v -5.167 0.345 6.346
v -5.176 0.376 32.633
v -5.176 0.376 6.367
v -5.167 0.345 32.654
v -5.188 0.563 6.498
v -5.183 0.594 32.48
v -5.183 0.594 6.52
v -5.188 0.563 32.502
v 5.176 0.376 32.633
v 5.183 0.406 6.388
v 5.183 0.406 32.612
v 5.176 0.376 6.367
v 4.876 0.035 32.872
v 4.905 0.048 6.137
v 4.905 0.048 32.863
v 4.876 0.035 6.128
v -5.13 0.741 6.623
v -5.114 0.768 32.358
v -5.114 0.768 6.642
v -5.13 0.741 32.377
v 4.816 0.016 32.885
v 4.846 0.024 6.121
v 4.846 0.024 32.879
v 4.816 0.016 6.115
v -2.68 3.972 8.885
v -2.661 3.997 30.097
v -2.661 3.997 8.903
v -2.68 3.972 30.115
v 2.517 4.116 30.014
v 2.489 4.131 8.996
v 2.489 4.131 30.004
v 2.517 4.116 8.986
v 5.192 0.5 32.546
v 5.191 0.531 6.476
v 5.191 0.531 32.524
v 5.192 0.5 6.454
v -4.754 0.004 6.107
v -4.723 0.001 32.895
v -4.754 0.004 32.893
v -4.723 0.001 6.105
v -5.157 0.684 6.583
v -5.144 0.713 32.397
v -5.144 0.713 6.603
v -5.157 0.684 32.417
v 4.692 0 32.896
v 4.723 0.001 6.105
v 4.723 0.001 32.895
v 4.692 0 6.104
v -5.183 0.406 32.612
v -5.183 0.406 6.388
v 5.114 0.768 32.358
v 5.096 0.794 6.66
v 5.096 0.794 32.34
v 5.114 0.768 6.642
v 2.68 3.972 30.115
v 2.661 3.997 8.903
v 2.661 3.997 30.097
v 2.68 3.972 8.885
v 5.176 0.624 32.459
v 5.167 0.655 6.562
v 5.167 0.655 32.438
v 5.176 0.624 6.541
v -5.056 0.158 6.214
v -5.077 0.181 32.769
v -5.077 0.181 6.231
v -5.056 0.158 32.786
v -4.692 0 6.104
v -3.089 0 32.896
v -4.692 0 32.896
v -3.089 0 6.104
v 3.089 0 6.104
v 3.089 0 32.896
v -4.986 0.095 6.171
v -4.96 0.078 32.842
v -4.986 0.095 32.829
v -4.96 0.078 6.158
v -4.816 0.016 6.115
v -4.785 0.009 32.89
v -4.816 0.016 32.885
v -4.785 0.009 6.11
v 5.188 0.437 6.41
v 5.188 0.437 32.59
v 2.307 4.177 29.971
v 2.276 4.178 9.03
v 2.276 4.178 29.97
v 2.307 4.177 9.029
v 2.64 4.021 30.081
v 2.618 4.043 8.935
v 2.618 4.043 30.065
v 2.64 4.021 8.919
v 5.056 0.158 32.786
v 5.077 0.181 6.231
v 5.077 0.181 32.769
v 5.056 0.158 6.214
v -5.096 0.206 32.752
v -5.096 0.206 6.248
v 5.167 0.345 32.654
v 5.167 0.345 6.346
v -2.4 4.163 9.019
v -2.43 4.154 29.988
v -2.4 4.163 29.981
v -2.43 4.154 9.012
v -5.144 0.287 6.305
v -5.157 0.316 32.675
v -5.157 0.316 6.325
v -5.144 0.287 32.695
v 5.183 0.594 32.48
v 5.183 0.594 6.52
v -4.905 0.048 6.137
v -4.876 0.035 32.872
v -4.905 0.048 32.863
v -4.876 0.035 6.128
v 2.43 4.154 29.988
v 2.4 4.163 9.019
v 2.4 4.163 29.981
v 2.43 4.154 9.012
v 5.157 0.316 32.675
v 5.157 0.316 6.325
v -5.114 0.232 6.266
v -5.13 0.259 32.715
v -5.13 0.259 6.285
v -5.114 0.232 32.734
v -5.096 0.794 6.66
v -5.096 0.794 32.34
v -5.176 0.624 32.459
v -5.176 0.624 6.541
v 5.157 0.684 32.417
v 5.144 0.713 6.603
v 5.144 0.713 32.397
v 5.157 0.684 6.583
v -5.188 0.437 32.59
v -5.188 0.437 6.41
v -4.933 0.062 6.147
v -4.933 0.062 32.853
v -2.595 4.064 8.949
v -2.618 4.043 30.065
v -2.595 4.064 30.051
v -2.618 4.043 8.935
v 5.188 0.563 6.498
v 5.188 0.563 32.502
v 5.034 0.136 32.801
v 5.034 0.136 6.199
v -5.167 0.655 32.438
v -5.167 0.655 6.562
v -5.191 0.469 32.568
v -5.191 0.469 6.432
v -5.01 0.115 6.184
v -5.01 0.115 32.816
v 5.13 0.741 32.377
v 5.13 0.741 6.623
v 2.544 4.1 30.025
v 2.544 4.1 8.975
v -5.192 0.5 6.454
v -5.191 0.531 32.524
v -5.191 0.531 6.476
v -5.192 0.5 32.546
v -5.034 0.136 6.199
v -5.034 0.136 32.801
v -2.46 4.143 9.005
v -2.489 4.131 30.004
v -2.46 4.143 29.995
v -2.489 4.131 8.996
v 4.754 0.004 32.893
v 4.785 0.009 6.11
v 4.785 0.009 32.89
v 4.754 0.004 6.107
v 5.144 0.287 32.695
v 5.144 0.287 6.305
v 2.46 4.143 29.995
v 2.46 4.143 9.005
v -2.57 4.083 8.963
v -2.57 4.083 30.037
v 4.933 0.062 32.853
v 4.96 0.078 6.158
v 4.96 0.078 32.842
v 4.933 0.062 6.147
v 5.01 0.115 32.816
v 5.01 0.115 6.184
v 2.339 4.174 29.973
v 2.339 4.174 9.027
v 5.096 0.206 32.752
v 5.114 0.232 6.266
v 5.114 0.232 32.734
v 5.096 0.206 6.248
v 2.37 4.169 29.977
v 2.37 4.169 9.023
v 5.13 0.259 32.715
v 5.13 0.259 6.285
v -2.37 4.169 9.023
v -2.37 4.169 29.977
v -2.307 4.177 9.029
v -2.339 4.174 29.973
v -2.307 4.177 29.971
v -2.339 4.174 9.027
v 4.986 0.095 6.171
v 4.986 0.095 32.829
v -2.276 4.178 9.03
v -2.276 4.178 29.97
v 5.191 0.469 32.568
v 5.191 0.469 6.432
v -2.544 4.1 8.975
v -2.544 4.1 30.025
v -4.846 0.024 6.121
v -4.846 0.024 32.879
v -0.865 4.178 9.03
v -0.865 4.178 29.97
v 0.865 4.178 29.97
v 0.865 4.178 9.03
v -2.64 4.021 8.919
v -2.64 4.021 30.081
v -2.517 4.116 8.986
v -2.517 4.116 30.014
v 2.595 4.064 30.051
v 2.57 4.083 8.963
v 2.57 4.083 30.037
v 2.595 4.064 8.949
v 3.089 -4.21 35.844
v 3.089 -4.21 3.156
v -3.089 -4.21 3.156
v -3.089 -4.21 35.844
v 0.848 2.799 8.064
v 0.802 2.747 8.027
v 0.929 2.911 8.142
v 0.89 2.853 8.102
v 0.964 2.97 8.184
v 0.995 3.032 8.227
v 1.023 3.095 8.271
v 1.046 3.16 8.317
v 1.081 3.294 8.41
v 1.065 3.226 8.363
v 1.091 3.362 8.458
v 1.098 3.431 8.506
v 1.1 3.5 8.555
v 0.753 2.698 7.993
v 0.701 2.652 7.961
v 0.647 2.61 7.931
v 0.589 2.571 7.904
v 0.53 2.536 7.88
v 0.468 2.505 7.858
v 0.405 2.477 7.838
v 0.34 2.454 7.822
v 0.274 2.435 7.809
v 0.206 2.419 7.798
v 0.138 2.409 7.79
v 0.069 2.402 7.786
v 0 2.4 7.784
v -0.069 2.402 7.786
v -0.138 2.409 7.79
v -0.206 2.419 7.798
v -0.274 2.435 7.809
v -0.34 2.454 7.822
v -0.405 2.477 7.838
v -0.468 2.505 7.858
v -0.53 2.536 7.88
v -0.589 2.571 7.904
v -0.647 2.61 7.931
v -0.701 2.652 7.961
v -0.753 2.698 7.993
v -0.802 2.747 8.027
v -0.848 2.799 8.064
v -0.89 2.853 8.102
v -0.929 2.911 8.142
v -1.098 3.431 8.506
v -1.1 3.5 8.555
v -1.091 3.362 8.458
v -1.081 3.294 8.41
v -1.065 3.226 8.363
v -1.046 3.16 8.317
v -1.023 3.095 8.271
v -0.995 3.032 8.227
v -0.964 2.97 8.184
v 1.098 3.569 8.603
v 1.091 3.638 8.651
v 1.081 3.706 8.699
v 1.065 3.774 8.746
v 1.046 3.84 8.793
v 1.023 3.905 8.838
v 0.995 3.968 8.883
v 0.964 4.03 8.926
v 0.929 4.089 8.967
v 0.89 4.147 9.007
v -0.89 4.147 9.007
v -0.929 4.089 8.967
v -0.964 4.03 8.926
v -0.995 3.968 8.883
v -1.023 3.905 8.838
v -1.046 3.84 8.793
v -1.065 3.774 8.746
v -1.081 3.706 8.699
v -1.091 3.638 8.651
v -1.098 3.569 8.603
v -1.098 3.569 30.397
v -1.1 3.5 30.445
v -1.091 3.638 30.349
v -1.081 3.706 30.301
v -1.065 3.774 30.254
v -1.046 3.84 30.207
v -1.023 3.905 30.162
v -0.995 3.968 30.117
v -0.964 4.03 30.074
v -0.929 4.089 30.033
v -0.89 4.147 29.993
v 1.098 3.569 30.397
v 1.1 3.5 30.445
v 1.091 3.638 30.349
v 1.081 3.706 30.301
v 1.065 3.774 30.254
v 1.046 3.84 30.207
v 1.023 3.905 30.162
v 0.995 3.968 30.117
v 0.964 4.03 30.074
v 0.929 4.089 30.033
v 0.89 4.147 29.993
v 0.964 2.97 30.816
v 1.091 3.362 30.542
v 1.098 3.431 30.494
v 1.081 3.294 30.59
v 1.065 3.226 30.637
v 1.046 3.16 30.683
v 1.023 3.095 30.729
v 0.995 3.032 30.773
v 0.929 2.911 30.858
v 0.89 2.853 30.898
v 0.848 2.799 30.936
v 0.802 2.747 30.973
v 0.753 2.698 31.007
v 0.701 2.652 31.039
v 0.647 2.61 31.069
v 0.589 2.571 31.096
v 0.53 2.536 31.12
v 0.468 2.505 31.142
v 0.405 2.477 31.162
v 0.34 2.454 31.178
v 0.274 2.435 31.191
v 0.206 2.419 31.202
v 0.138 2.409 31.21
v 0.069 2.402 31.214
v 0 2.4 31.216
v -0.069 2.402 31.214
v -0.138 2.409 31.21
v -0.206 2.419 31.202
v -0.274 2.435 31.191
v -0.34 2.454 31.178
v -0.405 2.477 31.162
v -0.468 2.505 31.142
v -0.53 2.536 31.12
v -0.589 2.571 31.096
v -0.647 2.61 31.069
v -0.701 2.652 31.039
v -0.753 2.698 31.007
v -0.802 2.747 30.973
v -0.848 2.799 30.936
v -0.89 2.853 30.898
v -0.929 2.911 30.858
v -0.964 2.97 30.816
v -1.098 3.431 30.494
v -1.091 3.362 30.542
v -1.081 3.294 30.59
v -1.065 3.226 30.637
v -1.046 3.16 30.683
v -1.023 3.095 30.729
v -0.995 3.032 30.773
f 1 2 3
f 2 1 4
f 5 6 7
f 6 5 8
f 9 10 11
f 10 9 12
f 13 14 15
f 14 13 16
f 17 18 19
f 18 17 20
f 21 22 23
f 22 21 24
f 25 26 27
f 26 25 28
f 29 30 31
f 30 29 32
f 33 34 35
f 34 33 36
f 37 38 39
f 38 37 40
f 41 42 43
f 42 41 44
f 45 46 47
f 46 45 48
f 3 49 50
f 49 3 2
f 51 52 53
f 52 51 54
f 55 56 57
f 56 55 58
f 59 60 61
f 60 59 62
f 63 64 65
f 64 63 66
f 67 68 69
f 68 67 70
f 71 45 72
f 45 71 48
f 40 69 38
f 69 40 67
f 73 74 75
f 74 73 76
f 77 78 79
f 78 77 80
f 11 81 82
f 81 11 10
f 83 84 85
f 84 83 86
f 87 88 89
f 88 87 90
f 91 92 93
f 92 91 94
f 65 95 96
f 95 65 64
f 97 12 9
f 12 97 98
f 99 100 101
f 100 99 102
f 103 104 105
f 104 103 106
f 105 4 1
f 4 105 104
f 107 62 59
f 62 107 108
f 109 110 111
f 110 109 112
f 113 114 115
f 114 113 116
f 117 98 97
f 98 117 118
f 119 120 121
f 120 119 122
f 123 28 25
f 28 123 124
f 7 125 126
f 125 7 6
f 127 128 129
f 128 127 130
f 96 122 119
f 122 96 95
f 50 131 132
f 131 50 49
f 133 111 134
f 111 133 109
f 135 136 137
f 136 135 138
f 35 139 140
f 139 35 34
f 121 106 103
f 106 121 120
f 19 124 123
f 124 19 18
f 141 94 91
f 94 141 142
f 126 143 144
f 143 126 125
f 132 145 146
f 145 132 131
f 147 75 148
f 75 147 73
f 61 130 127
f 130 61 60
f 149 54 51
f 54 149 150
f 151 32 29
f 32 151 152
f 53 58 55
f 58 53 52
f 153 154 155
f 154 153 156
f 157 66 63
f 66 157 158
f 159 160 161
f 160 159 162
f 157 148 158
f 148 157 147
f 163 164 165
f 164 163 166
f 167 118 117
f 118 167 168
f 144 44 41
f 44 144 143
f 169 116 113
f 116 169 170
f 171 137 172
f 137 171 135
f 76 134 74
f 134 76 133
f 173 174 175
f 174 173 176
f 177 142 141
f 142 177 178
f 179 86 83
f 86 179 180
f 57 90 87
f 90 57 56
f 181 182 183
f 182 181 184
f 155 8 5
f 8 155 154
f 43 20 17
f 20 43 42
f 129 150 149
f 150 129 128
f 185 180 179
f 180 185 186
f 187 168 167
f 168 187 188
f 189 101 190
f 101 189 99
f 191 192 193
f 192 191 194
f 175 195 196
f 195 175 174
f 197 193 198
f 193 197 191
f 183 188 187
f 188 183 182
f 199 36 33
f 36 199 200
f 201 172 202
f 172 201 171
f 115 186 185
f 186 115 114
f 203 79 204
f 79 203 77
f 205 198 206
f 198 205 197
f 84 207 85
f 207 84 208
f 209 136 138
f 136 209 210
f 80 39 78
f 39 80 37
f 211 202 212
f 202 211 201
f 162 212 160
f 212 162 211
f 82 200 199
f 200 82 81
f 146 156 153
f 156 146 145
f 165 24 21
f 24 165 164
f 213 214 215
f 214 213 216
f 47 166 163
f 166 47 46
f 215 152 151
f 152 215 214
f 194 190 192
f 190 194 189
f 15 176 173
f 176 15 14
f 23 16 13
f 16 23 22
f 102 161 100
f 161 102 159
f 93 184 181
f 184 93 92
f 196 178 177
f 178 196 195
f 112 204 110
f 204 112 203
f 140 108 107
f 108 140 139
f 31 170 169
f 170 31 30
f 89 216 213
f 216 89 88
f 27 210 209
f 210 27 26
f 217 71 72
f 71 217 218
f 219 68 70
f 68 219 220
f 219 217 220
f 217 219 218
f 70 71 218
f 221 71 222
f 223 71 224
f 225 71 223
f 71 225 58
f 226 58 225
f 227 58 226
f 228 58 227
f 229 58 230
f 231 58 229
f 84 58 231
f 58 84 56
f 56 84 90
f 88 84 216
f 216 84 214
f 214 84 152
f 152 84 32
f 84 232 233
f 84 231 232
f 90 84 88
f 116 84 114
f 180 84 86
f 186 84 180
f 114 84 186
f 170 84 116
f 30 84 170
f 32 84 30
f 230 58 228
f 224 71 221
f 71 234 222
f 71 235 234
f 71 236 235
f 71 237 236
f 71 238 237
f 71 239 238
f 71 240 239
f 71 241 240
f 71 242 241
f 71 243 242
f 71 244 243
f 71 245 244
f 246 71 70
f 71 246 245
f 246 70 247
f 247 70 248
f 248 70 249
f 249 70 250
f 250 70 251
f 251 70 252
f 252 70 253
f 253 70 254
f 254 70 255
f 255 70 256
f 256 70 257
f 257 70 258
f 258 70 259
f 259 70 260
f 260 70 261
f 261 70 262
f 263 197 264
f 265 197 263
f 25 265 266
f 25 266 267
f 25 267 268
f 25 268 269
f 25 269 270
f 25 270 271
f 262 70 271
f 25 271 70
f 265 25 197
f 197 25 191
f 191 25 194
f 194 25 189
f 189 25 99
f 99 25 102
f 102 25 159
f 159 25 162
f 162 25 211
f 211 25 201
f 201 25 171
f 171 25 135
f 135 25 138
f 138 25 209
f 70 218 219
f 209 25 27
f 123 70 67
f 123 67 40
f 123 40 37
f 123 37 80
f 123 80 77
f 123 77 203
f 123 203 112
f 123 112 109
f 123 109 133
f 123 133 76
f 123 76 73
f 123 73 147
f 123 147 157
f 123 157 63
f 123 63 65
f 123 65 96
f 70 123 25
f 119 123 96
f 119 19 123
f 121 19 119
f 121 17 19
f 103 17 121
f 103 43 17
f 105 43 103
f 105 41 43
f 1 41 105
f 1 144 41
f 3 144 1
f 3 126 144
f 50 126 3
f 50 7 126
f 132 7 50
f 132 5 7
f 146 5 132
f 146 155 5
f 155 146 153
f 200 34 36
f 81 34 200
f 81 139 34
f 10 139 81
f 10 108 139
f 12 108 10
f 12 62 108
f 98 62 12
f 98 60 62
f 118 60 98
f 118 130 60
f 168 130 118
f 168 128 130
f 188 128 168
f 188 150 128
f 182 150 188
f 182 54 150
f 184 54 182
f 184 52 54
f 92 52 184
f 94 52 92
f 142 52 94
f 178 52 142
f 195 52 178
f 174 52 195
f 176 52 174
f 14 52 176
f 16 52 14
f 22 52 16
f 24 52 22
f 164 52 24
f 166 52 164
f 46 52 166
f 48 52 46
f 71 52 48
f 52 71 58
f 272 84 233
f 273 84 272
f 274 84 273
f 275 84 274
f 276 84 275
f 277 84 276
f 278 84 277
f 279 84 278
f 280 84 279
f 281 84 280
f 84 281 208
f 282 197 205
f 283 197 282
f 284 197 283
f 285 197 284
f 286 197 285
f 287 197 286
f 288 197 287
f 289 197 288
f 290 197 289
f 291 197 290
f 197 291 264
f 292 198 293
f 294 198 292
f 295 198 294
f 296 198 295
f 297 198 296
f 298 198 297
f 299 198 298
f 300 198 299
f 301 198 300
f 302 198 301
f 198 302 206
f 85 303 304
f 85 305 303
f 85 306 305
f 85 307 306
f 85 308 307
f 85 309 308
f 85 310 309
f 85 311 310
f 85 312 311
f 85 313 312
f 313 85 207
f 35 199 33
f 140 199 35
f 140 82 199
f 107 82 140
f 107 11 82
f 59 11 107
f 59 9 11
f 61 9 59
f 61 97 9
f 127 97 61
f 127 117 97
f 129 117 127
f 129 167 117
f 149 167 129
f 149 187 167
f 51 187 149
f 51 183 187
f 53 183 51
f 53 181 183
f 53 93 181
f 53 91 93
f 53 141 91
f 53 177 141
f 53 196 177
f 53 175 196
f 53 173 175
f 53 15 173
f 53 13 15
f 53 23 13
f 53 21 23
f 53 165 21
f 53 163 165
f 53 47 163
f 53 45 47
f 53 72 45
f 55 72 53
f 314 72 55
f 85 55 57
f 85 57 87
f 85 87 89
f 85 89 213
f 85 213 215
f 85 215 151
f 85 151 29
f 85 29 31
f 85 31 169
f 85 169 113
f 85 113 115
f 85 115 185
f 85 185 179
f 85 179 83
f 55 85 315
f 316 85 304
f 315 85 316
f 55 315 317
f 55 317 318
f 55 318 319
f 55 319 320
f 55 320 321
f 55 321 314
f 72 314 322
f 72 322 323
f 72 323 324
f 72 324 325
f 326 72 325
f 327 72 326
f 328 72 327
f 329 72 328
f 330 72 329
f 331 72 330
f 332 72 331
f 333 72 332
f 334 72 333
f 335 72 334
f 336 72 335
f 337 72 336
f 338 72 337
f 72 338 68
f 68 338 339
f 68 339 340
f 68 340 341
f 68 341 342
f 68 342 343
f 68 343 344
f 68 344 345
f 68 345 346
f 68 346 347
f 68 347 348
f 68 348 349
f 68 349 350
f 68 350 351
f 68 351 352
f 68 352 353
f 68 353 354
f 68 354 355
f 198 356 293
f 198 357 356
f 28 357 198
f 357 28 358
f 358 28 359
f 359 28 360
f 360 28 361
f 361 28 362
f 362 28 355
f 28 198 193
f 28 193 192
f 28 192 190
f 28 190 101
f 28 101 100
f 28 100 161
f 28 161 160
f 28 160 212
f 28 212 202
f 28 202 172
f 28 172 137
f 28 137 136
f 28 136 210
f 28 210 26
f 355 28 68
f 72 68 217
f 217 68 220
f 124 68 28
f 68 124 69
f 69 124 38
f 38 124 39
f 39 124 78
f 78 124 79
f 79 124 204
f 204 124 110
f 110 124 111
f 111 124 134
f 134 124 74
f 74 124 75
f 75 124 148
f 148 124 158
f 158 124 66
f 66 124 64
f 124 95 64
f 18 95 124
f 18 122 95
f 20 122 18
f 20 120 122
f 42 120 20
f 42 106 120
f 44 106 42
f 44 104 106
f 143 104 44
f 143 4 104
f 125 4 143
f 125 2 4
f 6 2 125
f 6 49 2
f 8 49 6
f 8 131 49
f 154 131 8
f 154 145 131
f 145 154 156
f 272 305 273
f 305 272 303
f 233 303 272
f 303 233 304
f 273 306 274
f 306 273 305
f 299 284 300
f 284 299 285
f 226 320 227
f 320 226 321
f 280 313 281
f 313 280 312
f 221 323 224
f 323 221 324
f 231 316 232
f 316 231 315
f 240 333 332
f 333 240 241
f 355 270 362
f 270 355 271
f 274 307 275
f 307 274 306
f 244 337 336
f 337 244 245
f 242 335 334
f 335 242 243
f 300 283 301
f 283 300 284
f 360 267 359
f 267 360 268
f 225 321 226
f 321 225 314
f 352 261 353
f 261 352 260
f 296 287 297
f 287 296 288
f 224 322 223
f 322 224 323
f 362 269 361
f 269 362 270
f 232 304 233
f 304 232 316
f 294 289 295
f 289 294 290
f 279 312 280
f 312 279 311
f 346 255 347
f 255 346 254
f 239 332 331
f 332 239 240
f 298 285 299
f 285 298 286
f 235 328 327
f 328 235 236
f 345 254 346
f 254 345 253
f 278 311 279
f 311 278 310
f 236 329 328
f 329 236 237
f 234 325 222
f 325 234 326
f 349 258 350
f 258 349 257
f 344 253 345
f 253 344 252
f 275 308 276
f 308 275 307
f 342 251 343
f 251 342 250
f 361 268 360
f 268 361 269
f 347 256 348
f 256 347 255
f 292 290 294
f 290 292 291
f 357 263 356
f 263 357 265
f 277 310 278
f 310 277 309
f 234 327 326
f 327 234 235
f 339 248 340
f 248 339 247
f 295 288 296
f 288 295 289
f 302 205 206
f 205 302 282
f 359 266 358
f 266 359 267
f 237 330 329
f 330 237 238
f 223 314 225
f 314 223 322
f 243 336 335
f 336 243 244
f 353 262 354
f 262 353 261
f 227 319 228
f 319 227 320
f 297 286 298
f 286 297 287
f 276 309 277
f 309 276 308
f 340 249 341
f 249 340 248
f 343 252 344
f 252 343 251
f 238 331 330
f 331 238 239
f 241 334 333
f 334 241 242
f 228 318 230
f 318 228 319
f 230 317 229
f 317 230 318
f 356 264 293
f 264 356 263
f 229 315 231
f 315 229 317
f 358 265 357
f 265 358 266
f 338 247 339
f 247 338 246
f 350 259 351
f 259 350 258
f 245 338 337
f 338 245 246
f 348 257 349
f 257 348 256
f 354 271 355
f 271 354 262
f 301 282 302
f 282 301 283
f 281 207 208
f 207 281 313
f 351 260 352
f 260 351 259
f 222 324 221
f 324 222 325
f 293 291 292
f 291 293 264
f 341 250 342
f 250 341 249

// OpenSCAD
$fn=100;
// launch lug for 8010 and 20 rails
//
// https://8020.net/1010.html

LUG_ROD_1_8 = 1;
LUG_ROD_3_16 = 2;
LUG_RAIL_8010 =3;

module rail_launch_lug(lug_length=10)
{
    inch_to_mm = 25.4;
    fit = 0.70; // 1==tight fit <1 loose fit
    fit2 = 0.95;
    lug_stem_width = 0.256 * inch_to_mm*fit2;
    lug_stem_height = (0.087)  * inch_to_mm + 2;
    
    lug_top_width = 0.256 * inch_to_mm * fit;
    lug_base_width = 0.584 * inch_to_mm * fit;
    lug_height = (0.5 - .087-.356/2) * inch_to_mm * fit;
    lug_x1 = (lug_base_width - lug_top_width)/2;
    lug_x2 = (lug_base_width - lug_x1);

    //echo("lug_top_width  :", lug_top_width);
    //echo("lug_base_width :", lug_base_width);
    //echo("lug_height     :", lug_height);
    //echo("lug_stem_width :", lug_stem_width);
    //echo("lug_stem_height:", lug_stem_height);
    
    
    r = 0.5;

    difference()
    {
        translate([-lug_base_width/2,0,0])
        {
            // hull around 4 cylinders of radius r
            hull() {
                
            translate([r,r,0]) 
                cylinder(lug_length,r,r);

            translate([lug_x1, lug_height-1*r,0]) 
                cylinder(lug_length,r,r);

            translate([lug_x2,lug_height-1*r,0]) 
                cylinder(lug_length,r,r);

            translate([lug_base_width-r,r,0]) 
                cylinder(lug_length,r,r);

            };

            translate([lug_base_width/2,-lug_stem_height/2,lug_length/2]) 
                cube([lug_stem_width,lug_stem_height,lug_length],center=true);

        }
    
        // slanted bottom
        rotate([-55,0,0])
        cube([20,10,30], center=true);

        // slanted top
        translate([0,0,lug_length])
        rotate([55,0,0])
        cube([20,10,40], center=true);
        
        // remove some material to reduce weight
        translate([0,3.5,0])
        cylinder(lug_length+1,1.1,1.1);
        

    }
    

}

module lug(lug_od, lug_id, lug_height, block_width)
{
    difference() {
        hull() {
            difference() {
                union() {
                    cylinder(lug_height/2, lug_od/2, lug_od/2);
                    translate([-lug_od/2-block_width/2,0,lug_height/4])
                        cube([block_width,block_width,lug_height],center=true);
                }
                // slanted bottom
                //rotate([0,-55,0])
                //translate([+lug_od/2-block_width/2,0,lug_od/2-4])
                //cube([20,10,10], center=true);
                
                // slanted top
                //rotate([0,25,0])
                //translate([-10,0,lug_height+1])
                //cube([20,10,10], center=true);

            }
        }
        translate([0,0,-lug_height/2])
        cylinder(lug_height*2, lug_id/2, lug_id/2);
        

        
    }
}


module rail_launch_lug_glue(od, lug_length=10)
{
    rocket_r = od/2;
    support_r = rocket_r*0.6;
    sh = 3;

    translate([0,6.6,0])
    rotate([0,0,90])
    translate([-rocket_r-rocket_r/1.8,0,0])
    difference() {
        translate([rocket_r/2.3,0,0])
        cylinder(lug_length, support_r, support_r);

        // rocket body diameter
        translate([0,0,-.1])
        cylinder(lug_length+1, rocket_r, rocket_r);
    }

    rail_launch_lug(od);
}


rail_launch_lug(39);
